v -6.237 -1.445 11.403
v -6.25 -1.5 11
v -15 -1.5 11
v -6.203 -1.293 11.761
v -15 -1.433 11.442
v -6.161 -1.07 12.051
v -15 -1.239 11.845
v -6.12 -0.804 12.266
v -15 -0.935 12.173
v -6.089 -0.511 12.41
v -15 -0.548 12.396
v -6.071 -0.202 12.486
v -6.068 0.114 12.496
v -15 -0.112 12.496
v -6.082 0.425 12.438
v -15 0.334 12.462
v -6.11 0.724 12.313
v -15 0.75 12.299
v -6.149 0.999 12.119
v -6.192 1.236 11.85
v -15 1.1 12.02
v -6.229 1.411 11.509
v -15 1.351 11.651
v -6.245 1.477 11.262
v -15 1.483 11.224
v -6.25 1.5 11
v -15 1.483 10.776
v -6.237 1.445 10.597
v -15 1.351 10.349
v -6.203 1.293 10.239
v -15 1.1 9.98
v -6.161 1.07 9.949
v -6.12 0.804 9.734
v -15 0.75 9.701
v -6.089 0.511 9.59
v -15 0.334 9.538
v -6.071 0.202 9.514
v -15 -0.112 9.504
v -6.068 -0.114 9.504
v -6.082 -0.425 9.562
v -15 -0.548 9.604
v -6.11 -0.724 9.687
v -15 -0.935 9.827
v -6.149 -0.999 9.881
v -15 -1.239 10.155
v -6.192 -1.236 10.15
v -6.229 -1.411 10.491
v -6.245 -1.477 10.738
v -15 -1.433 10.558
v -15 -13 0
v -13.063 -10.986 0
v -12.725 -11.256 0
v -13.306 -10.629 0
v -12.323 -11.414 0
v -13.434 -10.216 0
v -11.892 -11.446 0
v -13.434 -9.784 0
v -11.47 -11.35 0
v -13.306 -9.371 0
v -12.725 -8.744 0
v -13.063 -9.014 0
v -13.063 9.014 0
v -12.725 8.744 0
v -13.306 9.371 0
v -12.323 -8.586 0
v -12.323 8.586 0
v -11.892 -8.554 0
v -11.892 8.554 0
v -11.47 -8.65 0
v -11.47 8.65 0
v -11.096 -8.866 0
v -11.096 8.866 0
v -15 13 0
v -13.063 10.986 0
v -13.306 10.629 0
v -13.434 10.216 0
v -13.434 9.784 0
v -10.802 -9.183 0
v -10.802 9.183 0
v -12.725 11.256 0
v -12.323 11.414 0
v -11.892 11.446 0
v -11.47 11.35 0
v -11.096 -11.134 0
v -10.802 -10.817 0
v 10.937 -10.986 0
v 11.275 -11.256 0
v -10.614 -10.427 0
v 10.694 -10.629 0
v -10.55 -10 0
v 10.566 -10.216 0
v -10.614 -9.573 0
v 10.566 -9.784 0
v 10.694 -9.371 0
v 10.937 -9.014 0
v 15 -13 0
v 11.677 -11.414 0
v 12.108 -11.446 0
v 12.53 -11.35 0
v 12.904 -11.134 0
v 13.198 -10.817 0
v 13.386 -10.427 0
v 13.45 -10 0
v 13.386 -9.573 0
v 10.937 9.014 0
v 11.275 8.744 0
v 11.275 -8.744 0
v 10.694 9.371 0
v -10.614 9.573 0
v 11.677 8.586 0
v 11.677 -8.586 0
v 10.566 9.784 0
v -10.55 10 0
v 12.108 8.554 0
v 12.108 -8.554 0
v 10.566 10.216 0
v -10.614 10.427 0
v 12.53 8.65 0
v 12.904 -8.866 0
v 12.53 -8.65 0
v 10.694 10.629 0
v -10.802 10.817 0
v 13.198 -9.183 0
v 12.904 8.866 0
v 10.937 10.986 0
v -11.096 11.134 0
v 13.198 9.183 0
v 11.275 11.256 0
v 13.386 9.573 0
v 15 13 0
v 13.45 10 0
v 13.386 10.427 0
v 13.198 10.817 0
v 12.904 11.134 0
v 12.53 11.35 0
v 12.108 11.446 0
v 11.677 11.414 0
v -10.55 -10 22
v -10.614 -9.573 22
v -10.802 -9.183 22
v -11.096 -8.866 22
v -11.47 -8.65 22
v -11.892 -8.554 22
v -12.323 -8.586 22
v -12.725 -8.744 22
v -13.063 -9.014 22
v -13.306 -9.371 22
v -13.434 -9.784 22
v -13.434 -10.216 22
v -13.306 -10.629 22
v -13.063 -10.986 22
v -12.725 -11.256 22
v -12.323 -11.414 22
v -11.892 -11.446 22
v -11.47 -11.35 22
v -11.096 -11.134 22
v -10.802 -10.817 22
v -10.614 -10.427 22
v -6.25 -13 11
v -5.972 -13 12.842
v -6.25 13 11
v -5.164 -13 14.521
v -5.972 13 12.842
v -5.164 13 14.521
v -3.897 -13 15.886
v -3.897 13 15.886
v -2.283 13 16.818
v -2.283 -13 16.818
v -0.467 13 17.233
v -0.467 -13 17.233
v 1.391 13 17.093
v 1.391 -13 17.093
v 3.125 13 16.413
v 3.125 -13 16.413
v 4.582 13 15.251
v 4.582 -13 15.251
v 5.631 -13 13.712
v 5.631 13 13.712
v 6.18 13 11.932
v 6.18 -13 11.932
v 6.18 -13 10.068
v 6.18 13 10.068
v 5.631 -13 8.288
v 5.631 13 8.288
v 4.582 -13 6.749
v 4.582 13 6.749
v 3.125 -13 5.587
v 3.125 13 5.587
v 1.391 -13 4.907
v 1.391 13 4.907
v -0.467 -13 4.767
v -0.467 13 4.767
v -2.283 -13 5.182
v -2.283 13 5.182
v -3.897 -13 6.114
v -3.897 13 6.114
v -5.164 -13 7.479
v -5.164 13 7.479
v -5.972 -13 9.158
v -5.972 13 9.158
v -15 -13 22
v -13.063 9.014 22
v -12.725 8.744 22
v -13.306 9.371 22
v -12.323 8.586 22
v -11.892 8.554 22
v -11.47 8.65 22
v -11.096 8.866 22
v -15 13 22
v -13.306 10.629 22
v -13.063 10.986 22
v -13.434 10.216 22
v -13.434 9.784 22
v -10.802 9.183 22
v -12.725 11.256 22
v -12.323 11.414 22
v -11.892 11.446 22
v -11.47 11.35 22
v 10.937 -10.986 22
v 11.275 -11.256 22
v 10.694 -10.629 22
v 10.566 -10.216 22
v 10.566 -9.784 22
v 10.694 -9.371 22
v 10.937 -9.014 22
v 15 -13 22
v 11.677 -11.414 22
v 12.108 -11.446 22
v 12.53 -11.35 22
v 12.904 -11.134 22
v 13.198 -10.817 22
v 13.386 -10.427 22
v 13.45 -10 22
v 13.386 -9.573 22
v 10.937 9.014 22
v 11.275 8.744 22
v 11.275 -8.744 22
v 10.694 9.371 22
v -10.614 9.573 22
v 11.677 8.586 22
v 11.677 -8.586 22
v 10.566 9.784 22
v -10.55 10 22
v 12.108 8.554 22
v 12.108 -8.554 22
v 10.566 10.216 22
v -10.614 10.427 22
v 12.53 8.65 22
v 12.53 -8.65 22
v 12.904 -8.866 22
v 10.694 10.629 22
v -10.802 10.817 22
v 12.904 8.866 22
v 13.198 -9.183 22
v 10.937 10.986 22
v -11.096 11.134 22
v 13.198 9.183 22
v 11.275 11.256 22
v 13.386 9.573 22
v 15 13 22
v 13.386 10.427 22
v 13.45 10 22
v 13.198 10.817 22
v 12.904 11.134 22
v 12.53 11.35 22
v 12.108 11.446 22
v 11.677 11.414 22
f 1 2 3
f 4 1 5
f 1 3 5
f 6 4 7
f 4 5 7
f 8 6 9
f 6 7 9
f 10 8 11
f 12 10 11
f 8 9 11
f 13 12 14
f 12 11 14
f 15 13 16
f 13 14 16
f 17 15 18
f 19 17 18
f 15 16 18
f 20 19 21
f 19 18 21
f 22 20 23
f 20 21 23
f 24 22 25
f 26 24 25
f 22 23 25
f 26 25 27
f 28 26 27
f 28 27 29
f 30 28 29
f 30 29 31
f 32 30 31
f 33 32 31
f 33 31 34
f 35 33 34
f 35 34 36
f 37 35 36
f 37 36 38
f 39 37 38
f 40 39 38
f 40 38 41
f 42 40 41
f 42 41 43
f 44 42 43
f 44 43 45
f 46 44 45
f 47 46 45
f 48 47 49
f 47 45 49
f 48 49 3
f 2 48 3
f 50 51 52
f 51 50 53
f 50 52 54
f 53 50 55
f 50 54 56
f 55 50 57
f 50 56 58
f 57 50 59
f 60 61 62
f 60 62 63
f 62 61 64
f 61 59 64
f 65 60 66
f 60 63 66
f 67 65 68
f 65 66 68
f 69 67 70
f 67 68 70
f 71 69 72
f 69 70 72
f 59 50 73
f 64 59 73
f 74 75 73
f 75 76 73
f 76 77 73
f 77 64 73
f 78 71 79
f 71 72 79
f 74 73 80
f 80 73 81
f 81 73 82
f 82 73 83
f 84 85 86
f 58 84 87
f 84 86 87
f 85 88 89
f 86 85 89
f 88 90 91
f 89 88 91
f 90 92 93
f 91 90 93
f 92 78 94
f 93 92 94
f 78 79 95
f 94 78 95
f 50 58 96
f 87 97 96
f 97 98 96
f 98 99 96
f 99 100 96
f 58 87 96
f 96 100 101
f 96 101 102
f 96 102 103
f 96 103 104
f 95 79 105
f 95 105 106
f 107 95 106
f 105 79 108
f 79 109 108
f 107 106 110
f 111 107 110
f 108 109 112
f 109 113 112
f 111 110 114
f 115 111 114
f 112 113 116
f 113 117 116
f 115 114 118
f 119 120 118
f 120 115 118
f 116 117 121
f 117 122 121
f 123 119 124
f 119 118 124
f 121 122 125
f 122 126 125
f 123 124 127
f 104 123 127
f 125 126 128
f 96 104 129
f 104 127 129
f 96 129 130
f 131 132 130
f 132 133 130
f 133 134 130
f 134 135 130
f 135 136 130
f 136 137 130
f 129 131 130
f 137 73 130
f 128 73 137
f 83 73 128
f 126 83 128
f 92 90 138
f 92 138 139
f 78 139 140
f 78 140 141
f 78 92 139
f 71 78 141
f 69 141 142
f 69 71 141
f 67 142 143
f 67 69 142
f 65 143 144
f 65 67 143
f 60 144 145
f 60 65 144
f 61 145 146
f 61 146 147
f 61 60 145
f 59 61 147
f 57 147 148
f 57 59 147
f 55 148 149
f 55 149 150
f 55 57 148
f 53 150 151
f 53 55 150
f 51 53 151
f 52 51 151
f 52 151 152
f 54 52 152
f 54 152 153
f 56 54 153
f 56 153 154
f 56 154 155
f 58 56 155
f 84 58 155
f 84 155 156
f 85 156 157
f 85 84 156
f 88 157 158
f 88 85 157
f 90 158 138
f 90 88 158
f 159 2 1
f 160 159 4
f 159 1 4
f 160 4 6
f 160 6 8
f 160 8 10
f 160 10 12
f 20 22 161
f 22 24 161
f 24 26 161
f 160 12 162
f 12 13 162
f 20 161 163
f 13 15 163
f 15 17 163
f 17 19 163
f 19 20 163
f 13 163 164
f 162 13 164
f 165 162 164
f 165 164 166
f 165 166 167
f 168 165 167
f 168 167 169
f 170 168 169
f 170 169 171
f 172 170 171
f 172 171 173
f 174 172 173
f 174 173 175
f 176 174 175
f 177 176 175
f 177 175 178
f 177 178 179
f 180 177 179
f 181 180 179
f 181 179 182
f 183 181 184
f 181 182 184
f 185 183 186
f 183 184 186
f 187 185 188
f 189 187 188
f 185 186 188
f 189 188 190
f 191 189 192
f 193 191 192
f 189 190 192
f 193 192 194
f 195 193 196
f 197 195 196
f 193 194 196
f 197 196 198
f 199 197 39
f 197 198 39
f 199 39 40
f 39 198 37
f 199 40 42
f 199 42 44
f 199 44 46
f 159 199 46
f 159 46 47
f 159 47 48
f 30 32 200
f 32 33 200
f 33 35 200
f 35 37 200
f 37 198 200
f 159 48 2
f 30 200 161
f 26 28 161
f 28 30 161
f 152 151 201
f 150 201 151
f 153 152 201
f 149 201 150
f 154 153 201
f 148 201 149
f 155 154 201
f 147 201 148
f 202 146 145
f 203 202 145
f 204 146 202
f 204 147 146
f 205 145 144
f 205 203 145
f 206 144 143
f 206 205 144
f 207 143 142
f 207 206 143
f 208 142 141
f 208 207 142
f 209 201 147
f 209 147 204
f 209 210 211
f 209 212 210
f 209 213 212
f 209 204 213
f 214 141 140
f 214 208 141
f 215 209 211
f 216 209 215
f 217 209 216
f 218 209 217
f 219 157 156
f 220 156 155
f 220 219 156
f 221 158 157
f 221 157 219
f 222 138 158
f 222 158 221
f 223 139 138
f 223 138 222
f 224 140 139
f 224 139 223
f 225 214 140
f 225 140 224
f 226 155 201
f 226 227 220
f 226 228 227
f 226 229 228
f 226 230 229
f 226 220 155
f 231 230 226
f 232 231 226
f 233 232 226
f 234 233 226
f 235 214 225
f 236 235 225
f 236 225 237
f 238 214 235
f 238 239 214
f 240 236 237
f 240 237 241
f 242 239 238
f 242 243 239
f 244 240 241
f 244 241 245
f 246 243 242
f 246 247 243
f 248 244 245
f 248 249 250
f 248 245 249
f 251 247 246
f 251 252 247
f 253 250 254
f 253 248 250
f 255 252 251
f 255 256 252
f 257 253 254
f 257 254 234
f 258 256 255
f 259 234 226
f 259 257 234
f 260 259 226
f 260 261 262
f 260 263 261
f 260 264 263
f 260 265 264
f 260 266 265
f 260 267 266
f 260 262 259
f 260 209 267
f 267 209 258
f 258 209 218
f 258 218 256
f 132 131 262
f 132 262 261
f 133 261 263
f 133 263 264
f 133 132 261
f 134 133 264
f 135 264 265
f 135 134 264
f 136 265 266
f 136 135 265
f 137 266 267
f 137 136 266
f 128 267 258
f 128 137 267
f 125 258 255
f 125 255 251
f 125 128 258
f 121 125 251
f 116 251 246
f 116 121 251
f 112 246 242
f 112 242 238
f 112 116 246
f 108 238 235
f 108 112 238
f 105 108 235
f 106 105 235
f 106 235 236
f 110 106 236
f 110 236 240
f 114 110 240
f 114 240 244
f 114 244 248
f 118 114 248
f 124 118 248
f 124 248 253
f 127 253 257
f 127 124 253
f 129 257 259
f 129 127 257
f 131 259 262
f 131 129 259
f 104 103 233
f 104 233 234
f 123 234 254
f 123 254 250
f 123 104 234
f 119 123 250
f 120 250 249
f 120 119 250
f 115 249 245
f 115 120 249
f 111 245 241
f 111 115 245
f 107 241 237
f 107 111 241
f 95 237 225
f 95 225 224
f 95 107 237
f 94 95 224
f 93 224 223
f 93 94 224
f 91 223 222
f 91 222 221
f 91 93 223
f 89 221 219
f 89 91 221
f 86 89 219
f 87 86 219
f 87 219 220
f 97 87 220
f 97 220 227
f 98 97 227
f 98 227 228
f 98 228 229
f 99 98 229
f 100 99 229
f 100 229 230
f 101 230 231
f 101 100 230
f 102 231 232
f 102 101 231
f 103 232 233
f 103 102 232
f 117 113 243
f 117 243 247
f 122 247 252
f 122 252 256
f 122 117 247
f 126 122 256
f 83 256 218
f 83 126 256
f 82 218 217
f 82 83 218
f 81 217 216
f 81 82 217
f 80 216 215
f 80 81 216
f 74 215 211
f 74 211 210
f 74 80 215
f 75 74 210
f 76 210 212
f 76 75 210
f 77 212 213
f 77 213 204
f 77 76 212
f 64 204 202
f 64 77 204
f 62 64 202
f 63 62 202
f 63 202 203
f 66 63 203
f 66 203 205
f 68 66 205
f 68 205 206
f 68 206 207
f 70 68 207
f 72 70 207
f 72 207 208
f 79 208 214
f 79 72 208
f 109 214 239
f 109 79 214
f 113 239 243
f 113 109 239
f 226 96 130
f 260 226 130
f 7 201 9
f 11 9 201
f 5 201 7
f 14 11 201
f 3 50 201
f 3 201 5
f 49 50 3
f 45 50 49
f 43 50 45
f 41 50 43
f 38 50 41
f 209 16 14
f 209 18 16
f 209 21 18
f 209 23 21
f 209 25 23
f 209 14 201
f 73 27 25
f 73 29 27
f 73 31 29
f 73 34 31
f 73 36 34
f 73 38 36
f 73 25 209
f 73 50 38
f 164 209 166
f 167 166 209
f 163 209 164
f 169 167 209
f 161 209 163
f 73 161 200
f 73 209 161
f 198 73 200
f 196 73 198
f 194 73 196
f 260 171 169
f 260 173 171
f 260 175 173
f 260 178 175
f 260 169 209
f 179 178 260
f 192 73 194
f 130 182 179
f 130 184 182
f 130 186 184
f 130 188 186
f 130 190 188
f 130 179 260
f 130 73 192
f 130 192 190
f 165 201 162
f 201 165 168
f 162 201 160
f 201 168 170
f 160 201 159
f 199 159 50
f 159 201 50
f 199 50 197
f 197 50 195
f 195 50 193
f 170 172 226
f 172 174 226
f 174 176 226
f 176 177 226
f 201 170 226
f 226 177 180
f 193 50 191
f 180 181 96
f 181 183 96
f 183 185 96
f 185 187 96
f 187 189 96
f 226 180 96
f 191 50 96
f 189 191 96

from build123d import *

# Parameters (mm, degrees)
F0_W     = 30
F0_H     = 26
F0_R     = 1.45
F1_DEPTH = 22
F2_R     = 6.25
F3_DEPTH = 26.001
F4_R     = 1.5
F5_DEPTH = 13


# Not quite as in the source:
# - a feature names something its author has since deleted; it is built from what else it names


with BuildPart() as f1:
    # F0 (on Top) → F1 (new body)
    with BuildSketch(Plane.XY):
        Rectangle(F0_W, F0_H)
        with Locations((-12, -10)):
            Circle(F0_R, mode=Mode.SUBTRACT)
        with Locations((12, -10)):
            Circle(F0_R, mode=Mode.SUBTRACT)
        with Locations((-12, 10)):
            Circle(F0_R, mode=Mode.SUBTRACT)
        with Locations((12, 10)):
            Circle(F0_R, mode=Mode.SUBTRACT)
    extrude(amount=F1_DEPTH)

    # F2 (on face) → F3 (cut, through all)
    with BuildSketch(Plane(origin=(0, 13, 0), x_dir=(-1, 0, 0), z_dir=(0, 1, 0))):
        with Locations((0, 11)):
            Circle(F2_R)
    extrude(amount=-F3_DEPTH, mode=Mode.SUBTRACT)

    # F4 (on face) → F5 (cut)
    with BuildSketch(Plane(origin=(-15, 0, 0), x_dir=(0, -1, 0), z_dir=(-1, 0, 0))):
        with Locations((0, 11)):
            Circle(F4_R)
    extrude(amount=-F5_DEPTH, mode=Mode.SUBTRACT)


solid = f1.part
